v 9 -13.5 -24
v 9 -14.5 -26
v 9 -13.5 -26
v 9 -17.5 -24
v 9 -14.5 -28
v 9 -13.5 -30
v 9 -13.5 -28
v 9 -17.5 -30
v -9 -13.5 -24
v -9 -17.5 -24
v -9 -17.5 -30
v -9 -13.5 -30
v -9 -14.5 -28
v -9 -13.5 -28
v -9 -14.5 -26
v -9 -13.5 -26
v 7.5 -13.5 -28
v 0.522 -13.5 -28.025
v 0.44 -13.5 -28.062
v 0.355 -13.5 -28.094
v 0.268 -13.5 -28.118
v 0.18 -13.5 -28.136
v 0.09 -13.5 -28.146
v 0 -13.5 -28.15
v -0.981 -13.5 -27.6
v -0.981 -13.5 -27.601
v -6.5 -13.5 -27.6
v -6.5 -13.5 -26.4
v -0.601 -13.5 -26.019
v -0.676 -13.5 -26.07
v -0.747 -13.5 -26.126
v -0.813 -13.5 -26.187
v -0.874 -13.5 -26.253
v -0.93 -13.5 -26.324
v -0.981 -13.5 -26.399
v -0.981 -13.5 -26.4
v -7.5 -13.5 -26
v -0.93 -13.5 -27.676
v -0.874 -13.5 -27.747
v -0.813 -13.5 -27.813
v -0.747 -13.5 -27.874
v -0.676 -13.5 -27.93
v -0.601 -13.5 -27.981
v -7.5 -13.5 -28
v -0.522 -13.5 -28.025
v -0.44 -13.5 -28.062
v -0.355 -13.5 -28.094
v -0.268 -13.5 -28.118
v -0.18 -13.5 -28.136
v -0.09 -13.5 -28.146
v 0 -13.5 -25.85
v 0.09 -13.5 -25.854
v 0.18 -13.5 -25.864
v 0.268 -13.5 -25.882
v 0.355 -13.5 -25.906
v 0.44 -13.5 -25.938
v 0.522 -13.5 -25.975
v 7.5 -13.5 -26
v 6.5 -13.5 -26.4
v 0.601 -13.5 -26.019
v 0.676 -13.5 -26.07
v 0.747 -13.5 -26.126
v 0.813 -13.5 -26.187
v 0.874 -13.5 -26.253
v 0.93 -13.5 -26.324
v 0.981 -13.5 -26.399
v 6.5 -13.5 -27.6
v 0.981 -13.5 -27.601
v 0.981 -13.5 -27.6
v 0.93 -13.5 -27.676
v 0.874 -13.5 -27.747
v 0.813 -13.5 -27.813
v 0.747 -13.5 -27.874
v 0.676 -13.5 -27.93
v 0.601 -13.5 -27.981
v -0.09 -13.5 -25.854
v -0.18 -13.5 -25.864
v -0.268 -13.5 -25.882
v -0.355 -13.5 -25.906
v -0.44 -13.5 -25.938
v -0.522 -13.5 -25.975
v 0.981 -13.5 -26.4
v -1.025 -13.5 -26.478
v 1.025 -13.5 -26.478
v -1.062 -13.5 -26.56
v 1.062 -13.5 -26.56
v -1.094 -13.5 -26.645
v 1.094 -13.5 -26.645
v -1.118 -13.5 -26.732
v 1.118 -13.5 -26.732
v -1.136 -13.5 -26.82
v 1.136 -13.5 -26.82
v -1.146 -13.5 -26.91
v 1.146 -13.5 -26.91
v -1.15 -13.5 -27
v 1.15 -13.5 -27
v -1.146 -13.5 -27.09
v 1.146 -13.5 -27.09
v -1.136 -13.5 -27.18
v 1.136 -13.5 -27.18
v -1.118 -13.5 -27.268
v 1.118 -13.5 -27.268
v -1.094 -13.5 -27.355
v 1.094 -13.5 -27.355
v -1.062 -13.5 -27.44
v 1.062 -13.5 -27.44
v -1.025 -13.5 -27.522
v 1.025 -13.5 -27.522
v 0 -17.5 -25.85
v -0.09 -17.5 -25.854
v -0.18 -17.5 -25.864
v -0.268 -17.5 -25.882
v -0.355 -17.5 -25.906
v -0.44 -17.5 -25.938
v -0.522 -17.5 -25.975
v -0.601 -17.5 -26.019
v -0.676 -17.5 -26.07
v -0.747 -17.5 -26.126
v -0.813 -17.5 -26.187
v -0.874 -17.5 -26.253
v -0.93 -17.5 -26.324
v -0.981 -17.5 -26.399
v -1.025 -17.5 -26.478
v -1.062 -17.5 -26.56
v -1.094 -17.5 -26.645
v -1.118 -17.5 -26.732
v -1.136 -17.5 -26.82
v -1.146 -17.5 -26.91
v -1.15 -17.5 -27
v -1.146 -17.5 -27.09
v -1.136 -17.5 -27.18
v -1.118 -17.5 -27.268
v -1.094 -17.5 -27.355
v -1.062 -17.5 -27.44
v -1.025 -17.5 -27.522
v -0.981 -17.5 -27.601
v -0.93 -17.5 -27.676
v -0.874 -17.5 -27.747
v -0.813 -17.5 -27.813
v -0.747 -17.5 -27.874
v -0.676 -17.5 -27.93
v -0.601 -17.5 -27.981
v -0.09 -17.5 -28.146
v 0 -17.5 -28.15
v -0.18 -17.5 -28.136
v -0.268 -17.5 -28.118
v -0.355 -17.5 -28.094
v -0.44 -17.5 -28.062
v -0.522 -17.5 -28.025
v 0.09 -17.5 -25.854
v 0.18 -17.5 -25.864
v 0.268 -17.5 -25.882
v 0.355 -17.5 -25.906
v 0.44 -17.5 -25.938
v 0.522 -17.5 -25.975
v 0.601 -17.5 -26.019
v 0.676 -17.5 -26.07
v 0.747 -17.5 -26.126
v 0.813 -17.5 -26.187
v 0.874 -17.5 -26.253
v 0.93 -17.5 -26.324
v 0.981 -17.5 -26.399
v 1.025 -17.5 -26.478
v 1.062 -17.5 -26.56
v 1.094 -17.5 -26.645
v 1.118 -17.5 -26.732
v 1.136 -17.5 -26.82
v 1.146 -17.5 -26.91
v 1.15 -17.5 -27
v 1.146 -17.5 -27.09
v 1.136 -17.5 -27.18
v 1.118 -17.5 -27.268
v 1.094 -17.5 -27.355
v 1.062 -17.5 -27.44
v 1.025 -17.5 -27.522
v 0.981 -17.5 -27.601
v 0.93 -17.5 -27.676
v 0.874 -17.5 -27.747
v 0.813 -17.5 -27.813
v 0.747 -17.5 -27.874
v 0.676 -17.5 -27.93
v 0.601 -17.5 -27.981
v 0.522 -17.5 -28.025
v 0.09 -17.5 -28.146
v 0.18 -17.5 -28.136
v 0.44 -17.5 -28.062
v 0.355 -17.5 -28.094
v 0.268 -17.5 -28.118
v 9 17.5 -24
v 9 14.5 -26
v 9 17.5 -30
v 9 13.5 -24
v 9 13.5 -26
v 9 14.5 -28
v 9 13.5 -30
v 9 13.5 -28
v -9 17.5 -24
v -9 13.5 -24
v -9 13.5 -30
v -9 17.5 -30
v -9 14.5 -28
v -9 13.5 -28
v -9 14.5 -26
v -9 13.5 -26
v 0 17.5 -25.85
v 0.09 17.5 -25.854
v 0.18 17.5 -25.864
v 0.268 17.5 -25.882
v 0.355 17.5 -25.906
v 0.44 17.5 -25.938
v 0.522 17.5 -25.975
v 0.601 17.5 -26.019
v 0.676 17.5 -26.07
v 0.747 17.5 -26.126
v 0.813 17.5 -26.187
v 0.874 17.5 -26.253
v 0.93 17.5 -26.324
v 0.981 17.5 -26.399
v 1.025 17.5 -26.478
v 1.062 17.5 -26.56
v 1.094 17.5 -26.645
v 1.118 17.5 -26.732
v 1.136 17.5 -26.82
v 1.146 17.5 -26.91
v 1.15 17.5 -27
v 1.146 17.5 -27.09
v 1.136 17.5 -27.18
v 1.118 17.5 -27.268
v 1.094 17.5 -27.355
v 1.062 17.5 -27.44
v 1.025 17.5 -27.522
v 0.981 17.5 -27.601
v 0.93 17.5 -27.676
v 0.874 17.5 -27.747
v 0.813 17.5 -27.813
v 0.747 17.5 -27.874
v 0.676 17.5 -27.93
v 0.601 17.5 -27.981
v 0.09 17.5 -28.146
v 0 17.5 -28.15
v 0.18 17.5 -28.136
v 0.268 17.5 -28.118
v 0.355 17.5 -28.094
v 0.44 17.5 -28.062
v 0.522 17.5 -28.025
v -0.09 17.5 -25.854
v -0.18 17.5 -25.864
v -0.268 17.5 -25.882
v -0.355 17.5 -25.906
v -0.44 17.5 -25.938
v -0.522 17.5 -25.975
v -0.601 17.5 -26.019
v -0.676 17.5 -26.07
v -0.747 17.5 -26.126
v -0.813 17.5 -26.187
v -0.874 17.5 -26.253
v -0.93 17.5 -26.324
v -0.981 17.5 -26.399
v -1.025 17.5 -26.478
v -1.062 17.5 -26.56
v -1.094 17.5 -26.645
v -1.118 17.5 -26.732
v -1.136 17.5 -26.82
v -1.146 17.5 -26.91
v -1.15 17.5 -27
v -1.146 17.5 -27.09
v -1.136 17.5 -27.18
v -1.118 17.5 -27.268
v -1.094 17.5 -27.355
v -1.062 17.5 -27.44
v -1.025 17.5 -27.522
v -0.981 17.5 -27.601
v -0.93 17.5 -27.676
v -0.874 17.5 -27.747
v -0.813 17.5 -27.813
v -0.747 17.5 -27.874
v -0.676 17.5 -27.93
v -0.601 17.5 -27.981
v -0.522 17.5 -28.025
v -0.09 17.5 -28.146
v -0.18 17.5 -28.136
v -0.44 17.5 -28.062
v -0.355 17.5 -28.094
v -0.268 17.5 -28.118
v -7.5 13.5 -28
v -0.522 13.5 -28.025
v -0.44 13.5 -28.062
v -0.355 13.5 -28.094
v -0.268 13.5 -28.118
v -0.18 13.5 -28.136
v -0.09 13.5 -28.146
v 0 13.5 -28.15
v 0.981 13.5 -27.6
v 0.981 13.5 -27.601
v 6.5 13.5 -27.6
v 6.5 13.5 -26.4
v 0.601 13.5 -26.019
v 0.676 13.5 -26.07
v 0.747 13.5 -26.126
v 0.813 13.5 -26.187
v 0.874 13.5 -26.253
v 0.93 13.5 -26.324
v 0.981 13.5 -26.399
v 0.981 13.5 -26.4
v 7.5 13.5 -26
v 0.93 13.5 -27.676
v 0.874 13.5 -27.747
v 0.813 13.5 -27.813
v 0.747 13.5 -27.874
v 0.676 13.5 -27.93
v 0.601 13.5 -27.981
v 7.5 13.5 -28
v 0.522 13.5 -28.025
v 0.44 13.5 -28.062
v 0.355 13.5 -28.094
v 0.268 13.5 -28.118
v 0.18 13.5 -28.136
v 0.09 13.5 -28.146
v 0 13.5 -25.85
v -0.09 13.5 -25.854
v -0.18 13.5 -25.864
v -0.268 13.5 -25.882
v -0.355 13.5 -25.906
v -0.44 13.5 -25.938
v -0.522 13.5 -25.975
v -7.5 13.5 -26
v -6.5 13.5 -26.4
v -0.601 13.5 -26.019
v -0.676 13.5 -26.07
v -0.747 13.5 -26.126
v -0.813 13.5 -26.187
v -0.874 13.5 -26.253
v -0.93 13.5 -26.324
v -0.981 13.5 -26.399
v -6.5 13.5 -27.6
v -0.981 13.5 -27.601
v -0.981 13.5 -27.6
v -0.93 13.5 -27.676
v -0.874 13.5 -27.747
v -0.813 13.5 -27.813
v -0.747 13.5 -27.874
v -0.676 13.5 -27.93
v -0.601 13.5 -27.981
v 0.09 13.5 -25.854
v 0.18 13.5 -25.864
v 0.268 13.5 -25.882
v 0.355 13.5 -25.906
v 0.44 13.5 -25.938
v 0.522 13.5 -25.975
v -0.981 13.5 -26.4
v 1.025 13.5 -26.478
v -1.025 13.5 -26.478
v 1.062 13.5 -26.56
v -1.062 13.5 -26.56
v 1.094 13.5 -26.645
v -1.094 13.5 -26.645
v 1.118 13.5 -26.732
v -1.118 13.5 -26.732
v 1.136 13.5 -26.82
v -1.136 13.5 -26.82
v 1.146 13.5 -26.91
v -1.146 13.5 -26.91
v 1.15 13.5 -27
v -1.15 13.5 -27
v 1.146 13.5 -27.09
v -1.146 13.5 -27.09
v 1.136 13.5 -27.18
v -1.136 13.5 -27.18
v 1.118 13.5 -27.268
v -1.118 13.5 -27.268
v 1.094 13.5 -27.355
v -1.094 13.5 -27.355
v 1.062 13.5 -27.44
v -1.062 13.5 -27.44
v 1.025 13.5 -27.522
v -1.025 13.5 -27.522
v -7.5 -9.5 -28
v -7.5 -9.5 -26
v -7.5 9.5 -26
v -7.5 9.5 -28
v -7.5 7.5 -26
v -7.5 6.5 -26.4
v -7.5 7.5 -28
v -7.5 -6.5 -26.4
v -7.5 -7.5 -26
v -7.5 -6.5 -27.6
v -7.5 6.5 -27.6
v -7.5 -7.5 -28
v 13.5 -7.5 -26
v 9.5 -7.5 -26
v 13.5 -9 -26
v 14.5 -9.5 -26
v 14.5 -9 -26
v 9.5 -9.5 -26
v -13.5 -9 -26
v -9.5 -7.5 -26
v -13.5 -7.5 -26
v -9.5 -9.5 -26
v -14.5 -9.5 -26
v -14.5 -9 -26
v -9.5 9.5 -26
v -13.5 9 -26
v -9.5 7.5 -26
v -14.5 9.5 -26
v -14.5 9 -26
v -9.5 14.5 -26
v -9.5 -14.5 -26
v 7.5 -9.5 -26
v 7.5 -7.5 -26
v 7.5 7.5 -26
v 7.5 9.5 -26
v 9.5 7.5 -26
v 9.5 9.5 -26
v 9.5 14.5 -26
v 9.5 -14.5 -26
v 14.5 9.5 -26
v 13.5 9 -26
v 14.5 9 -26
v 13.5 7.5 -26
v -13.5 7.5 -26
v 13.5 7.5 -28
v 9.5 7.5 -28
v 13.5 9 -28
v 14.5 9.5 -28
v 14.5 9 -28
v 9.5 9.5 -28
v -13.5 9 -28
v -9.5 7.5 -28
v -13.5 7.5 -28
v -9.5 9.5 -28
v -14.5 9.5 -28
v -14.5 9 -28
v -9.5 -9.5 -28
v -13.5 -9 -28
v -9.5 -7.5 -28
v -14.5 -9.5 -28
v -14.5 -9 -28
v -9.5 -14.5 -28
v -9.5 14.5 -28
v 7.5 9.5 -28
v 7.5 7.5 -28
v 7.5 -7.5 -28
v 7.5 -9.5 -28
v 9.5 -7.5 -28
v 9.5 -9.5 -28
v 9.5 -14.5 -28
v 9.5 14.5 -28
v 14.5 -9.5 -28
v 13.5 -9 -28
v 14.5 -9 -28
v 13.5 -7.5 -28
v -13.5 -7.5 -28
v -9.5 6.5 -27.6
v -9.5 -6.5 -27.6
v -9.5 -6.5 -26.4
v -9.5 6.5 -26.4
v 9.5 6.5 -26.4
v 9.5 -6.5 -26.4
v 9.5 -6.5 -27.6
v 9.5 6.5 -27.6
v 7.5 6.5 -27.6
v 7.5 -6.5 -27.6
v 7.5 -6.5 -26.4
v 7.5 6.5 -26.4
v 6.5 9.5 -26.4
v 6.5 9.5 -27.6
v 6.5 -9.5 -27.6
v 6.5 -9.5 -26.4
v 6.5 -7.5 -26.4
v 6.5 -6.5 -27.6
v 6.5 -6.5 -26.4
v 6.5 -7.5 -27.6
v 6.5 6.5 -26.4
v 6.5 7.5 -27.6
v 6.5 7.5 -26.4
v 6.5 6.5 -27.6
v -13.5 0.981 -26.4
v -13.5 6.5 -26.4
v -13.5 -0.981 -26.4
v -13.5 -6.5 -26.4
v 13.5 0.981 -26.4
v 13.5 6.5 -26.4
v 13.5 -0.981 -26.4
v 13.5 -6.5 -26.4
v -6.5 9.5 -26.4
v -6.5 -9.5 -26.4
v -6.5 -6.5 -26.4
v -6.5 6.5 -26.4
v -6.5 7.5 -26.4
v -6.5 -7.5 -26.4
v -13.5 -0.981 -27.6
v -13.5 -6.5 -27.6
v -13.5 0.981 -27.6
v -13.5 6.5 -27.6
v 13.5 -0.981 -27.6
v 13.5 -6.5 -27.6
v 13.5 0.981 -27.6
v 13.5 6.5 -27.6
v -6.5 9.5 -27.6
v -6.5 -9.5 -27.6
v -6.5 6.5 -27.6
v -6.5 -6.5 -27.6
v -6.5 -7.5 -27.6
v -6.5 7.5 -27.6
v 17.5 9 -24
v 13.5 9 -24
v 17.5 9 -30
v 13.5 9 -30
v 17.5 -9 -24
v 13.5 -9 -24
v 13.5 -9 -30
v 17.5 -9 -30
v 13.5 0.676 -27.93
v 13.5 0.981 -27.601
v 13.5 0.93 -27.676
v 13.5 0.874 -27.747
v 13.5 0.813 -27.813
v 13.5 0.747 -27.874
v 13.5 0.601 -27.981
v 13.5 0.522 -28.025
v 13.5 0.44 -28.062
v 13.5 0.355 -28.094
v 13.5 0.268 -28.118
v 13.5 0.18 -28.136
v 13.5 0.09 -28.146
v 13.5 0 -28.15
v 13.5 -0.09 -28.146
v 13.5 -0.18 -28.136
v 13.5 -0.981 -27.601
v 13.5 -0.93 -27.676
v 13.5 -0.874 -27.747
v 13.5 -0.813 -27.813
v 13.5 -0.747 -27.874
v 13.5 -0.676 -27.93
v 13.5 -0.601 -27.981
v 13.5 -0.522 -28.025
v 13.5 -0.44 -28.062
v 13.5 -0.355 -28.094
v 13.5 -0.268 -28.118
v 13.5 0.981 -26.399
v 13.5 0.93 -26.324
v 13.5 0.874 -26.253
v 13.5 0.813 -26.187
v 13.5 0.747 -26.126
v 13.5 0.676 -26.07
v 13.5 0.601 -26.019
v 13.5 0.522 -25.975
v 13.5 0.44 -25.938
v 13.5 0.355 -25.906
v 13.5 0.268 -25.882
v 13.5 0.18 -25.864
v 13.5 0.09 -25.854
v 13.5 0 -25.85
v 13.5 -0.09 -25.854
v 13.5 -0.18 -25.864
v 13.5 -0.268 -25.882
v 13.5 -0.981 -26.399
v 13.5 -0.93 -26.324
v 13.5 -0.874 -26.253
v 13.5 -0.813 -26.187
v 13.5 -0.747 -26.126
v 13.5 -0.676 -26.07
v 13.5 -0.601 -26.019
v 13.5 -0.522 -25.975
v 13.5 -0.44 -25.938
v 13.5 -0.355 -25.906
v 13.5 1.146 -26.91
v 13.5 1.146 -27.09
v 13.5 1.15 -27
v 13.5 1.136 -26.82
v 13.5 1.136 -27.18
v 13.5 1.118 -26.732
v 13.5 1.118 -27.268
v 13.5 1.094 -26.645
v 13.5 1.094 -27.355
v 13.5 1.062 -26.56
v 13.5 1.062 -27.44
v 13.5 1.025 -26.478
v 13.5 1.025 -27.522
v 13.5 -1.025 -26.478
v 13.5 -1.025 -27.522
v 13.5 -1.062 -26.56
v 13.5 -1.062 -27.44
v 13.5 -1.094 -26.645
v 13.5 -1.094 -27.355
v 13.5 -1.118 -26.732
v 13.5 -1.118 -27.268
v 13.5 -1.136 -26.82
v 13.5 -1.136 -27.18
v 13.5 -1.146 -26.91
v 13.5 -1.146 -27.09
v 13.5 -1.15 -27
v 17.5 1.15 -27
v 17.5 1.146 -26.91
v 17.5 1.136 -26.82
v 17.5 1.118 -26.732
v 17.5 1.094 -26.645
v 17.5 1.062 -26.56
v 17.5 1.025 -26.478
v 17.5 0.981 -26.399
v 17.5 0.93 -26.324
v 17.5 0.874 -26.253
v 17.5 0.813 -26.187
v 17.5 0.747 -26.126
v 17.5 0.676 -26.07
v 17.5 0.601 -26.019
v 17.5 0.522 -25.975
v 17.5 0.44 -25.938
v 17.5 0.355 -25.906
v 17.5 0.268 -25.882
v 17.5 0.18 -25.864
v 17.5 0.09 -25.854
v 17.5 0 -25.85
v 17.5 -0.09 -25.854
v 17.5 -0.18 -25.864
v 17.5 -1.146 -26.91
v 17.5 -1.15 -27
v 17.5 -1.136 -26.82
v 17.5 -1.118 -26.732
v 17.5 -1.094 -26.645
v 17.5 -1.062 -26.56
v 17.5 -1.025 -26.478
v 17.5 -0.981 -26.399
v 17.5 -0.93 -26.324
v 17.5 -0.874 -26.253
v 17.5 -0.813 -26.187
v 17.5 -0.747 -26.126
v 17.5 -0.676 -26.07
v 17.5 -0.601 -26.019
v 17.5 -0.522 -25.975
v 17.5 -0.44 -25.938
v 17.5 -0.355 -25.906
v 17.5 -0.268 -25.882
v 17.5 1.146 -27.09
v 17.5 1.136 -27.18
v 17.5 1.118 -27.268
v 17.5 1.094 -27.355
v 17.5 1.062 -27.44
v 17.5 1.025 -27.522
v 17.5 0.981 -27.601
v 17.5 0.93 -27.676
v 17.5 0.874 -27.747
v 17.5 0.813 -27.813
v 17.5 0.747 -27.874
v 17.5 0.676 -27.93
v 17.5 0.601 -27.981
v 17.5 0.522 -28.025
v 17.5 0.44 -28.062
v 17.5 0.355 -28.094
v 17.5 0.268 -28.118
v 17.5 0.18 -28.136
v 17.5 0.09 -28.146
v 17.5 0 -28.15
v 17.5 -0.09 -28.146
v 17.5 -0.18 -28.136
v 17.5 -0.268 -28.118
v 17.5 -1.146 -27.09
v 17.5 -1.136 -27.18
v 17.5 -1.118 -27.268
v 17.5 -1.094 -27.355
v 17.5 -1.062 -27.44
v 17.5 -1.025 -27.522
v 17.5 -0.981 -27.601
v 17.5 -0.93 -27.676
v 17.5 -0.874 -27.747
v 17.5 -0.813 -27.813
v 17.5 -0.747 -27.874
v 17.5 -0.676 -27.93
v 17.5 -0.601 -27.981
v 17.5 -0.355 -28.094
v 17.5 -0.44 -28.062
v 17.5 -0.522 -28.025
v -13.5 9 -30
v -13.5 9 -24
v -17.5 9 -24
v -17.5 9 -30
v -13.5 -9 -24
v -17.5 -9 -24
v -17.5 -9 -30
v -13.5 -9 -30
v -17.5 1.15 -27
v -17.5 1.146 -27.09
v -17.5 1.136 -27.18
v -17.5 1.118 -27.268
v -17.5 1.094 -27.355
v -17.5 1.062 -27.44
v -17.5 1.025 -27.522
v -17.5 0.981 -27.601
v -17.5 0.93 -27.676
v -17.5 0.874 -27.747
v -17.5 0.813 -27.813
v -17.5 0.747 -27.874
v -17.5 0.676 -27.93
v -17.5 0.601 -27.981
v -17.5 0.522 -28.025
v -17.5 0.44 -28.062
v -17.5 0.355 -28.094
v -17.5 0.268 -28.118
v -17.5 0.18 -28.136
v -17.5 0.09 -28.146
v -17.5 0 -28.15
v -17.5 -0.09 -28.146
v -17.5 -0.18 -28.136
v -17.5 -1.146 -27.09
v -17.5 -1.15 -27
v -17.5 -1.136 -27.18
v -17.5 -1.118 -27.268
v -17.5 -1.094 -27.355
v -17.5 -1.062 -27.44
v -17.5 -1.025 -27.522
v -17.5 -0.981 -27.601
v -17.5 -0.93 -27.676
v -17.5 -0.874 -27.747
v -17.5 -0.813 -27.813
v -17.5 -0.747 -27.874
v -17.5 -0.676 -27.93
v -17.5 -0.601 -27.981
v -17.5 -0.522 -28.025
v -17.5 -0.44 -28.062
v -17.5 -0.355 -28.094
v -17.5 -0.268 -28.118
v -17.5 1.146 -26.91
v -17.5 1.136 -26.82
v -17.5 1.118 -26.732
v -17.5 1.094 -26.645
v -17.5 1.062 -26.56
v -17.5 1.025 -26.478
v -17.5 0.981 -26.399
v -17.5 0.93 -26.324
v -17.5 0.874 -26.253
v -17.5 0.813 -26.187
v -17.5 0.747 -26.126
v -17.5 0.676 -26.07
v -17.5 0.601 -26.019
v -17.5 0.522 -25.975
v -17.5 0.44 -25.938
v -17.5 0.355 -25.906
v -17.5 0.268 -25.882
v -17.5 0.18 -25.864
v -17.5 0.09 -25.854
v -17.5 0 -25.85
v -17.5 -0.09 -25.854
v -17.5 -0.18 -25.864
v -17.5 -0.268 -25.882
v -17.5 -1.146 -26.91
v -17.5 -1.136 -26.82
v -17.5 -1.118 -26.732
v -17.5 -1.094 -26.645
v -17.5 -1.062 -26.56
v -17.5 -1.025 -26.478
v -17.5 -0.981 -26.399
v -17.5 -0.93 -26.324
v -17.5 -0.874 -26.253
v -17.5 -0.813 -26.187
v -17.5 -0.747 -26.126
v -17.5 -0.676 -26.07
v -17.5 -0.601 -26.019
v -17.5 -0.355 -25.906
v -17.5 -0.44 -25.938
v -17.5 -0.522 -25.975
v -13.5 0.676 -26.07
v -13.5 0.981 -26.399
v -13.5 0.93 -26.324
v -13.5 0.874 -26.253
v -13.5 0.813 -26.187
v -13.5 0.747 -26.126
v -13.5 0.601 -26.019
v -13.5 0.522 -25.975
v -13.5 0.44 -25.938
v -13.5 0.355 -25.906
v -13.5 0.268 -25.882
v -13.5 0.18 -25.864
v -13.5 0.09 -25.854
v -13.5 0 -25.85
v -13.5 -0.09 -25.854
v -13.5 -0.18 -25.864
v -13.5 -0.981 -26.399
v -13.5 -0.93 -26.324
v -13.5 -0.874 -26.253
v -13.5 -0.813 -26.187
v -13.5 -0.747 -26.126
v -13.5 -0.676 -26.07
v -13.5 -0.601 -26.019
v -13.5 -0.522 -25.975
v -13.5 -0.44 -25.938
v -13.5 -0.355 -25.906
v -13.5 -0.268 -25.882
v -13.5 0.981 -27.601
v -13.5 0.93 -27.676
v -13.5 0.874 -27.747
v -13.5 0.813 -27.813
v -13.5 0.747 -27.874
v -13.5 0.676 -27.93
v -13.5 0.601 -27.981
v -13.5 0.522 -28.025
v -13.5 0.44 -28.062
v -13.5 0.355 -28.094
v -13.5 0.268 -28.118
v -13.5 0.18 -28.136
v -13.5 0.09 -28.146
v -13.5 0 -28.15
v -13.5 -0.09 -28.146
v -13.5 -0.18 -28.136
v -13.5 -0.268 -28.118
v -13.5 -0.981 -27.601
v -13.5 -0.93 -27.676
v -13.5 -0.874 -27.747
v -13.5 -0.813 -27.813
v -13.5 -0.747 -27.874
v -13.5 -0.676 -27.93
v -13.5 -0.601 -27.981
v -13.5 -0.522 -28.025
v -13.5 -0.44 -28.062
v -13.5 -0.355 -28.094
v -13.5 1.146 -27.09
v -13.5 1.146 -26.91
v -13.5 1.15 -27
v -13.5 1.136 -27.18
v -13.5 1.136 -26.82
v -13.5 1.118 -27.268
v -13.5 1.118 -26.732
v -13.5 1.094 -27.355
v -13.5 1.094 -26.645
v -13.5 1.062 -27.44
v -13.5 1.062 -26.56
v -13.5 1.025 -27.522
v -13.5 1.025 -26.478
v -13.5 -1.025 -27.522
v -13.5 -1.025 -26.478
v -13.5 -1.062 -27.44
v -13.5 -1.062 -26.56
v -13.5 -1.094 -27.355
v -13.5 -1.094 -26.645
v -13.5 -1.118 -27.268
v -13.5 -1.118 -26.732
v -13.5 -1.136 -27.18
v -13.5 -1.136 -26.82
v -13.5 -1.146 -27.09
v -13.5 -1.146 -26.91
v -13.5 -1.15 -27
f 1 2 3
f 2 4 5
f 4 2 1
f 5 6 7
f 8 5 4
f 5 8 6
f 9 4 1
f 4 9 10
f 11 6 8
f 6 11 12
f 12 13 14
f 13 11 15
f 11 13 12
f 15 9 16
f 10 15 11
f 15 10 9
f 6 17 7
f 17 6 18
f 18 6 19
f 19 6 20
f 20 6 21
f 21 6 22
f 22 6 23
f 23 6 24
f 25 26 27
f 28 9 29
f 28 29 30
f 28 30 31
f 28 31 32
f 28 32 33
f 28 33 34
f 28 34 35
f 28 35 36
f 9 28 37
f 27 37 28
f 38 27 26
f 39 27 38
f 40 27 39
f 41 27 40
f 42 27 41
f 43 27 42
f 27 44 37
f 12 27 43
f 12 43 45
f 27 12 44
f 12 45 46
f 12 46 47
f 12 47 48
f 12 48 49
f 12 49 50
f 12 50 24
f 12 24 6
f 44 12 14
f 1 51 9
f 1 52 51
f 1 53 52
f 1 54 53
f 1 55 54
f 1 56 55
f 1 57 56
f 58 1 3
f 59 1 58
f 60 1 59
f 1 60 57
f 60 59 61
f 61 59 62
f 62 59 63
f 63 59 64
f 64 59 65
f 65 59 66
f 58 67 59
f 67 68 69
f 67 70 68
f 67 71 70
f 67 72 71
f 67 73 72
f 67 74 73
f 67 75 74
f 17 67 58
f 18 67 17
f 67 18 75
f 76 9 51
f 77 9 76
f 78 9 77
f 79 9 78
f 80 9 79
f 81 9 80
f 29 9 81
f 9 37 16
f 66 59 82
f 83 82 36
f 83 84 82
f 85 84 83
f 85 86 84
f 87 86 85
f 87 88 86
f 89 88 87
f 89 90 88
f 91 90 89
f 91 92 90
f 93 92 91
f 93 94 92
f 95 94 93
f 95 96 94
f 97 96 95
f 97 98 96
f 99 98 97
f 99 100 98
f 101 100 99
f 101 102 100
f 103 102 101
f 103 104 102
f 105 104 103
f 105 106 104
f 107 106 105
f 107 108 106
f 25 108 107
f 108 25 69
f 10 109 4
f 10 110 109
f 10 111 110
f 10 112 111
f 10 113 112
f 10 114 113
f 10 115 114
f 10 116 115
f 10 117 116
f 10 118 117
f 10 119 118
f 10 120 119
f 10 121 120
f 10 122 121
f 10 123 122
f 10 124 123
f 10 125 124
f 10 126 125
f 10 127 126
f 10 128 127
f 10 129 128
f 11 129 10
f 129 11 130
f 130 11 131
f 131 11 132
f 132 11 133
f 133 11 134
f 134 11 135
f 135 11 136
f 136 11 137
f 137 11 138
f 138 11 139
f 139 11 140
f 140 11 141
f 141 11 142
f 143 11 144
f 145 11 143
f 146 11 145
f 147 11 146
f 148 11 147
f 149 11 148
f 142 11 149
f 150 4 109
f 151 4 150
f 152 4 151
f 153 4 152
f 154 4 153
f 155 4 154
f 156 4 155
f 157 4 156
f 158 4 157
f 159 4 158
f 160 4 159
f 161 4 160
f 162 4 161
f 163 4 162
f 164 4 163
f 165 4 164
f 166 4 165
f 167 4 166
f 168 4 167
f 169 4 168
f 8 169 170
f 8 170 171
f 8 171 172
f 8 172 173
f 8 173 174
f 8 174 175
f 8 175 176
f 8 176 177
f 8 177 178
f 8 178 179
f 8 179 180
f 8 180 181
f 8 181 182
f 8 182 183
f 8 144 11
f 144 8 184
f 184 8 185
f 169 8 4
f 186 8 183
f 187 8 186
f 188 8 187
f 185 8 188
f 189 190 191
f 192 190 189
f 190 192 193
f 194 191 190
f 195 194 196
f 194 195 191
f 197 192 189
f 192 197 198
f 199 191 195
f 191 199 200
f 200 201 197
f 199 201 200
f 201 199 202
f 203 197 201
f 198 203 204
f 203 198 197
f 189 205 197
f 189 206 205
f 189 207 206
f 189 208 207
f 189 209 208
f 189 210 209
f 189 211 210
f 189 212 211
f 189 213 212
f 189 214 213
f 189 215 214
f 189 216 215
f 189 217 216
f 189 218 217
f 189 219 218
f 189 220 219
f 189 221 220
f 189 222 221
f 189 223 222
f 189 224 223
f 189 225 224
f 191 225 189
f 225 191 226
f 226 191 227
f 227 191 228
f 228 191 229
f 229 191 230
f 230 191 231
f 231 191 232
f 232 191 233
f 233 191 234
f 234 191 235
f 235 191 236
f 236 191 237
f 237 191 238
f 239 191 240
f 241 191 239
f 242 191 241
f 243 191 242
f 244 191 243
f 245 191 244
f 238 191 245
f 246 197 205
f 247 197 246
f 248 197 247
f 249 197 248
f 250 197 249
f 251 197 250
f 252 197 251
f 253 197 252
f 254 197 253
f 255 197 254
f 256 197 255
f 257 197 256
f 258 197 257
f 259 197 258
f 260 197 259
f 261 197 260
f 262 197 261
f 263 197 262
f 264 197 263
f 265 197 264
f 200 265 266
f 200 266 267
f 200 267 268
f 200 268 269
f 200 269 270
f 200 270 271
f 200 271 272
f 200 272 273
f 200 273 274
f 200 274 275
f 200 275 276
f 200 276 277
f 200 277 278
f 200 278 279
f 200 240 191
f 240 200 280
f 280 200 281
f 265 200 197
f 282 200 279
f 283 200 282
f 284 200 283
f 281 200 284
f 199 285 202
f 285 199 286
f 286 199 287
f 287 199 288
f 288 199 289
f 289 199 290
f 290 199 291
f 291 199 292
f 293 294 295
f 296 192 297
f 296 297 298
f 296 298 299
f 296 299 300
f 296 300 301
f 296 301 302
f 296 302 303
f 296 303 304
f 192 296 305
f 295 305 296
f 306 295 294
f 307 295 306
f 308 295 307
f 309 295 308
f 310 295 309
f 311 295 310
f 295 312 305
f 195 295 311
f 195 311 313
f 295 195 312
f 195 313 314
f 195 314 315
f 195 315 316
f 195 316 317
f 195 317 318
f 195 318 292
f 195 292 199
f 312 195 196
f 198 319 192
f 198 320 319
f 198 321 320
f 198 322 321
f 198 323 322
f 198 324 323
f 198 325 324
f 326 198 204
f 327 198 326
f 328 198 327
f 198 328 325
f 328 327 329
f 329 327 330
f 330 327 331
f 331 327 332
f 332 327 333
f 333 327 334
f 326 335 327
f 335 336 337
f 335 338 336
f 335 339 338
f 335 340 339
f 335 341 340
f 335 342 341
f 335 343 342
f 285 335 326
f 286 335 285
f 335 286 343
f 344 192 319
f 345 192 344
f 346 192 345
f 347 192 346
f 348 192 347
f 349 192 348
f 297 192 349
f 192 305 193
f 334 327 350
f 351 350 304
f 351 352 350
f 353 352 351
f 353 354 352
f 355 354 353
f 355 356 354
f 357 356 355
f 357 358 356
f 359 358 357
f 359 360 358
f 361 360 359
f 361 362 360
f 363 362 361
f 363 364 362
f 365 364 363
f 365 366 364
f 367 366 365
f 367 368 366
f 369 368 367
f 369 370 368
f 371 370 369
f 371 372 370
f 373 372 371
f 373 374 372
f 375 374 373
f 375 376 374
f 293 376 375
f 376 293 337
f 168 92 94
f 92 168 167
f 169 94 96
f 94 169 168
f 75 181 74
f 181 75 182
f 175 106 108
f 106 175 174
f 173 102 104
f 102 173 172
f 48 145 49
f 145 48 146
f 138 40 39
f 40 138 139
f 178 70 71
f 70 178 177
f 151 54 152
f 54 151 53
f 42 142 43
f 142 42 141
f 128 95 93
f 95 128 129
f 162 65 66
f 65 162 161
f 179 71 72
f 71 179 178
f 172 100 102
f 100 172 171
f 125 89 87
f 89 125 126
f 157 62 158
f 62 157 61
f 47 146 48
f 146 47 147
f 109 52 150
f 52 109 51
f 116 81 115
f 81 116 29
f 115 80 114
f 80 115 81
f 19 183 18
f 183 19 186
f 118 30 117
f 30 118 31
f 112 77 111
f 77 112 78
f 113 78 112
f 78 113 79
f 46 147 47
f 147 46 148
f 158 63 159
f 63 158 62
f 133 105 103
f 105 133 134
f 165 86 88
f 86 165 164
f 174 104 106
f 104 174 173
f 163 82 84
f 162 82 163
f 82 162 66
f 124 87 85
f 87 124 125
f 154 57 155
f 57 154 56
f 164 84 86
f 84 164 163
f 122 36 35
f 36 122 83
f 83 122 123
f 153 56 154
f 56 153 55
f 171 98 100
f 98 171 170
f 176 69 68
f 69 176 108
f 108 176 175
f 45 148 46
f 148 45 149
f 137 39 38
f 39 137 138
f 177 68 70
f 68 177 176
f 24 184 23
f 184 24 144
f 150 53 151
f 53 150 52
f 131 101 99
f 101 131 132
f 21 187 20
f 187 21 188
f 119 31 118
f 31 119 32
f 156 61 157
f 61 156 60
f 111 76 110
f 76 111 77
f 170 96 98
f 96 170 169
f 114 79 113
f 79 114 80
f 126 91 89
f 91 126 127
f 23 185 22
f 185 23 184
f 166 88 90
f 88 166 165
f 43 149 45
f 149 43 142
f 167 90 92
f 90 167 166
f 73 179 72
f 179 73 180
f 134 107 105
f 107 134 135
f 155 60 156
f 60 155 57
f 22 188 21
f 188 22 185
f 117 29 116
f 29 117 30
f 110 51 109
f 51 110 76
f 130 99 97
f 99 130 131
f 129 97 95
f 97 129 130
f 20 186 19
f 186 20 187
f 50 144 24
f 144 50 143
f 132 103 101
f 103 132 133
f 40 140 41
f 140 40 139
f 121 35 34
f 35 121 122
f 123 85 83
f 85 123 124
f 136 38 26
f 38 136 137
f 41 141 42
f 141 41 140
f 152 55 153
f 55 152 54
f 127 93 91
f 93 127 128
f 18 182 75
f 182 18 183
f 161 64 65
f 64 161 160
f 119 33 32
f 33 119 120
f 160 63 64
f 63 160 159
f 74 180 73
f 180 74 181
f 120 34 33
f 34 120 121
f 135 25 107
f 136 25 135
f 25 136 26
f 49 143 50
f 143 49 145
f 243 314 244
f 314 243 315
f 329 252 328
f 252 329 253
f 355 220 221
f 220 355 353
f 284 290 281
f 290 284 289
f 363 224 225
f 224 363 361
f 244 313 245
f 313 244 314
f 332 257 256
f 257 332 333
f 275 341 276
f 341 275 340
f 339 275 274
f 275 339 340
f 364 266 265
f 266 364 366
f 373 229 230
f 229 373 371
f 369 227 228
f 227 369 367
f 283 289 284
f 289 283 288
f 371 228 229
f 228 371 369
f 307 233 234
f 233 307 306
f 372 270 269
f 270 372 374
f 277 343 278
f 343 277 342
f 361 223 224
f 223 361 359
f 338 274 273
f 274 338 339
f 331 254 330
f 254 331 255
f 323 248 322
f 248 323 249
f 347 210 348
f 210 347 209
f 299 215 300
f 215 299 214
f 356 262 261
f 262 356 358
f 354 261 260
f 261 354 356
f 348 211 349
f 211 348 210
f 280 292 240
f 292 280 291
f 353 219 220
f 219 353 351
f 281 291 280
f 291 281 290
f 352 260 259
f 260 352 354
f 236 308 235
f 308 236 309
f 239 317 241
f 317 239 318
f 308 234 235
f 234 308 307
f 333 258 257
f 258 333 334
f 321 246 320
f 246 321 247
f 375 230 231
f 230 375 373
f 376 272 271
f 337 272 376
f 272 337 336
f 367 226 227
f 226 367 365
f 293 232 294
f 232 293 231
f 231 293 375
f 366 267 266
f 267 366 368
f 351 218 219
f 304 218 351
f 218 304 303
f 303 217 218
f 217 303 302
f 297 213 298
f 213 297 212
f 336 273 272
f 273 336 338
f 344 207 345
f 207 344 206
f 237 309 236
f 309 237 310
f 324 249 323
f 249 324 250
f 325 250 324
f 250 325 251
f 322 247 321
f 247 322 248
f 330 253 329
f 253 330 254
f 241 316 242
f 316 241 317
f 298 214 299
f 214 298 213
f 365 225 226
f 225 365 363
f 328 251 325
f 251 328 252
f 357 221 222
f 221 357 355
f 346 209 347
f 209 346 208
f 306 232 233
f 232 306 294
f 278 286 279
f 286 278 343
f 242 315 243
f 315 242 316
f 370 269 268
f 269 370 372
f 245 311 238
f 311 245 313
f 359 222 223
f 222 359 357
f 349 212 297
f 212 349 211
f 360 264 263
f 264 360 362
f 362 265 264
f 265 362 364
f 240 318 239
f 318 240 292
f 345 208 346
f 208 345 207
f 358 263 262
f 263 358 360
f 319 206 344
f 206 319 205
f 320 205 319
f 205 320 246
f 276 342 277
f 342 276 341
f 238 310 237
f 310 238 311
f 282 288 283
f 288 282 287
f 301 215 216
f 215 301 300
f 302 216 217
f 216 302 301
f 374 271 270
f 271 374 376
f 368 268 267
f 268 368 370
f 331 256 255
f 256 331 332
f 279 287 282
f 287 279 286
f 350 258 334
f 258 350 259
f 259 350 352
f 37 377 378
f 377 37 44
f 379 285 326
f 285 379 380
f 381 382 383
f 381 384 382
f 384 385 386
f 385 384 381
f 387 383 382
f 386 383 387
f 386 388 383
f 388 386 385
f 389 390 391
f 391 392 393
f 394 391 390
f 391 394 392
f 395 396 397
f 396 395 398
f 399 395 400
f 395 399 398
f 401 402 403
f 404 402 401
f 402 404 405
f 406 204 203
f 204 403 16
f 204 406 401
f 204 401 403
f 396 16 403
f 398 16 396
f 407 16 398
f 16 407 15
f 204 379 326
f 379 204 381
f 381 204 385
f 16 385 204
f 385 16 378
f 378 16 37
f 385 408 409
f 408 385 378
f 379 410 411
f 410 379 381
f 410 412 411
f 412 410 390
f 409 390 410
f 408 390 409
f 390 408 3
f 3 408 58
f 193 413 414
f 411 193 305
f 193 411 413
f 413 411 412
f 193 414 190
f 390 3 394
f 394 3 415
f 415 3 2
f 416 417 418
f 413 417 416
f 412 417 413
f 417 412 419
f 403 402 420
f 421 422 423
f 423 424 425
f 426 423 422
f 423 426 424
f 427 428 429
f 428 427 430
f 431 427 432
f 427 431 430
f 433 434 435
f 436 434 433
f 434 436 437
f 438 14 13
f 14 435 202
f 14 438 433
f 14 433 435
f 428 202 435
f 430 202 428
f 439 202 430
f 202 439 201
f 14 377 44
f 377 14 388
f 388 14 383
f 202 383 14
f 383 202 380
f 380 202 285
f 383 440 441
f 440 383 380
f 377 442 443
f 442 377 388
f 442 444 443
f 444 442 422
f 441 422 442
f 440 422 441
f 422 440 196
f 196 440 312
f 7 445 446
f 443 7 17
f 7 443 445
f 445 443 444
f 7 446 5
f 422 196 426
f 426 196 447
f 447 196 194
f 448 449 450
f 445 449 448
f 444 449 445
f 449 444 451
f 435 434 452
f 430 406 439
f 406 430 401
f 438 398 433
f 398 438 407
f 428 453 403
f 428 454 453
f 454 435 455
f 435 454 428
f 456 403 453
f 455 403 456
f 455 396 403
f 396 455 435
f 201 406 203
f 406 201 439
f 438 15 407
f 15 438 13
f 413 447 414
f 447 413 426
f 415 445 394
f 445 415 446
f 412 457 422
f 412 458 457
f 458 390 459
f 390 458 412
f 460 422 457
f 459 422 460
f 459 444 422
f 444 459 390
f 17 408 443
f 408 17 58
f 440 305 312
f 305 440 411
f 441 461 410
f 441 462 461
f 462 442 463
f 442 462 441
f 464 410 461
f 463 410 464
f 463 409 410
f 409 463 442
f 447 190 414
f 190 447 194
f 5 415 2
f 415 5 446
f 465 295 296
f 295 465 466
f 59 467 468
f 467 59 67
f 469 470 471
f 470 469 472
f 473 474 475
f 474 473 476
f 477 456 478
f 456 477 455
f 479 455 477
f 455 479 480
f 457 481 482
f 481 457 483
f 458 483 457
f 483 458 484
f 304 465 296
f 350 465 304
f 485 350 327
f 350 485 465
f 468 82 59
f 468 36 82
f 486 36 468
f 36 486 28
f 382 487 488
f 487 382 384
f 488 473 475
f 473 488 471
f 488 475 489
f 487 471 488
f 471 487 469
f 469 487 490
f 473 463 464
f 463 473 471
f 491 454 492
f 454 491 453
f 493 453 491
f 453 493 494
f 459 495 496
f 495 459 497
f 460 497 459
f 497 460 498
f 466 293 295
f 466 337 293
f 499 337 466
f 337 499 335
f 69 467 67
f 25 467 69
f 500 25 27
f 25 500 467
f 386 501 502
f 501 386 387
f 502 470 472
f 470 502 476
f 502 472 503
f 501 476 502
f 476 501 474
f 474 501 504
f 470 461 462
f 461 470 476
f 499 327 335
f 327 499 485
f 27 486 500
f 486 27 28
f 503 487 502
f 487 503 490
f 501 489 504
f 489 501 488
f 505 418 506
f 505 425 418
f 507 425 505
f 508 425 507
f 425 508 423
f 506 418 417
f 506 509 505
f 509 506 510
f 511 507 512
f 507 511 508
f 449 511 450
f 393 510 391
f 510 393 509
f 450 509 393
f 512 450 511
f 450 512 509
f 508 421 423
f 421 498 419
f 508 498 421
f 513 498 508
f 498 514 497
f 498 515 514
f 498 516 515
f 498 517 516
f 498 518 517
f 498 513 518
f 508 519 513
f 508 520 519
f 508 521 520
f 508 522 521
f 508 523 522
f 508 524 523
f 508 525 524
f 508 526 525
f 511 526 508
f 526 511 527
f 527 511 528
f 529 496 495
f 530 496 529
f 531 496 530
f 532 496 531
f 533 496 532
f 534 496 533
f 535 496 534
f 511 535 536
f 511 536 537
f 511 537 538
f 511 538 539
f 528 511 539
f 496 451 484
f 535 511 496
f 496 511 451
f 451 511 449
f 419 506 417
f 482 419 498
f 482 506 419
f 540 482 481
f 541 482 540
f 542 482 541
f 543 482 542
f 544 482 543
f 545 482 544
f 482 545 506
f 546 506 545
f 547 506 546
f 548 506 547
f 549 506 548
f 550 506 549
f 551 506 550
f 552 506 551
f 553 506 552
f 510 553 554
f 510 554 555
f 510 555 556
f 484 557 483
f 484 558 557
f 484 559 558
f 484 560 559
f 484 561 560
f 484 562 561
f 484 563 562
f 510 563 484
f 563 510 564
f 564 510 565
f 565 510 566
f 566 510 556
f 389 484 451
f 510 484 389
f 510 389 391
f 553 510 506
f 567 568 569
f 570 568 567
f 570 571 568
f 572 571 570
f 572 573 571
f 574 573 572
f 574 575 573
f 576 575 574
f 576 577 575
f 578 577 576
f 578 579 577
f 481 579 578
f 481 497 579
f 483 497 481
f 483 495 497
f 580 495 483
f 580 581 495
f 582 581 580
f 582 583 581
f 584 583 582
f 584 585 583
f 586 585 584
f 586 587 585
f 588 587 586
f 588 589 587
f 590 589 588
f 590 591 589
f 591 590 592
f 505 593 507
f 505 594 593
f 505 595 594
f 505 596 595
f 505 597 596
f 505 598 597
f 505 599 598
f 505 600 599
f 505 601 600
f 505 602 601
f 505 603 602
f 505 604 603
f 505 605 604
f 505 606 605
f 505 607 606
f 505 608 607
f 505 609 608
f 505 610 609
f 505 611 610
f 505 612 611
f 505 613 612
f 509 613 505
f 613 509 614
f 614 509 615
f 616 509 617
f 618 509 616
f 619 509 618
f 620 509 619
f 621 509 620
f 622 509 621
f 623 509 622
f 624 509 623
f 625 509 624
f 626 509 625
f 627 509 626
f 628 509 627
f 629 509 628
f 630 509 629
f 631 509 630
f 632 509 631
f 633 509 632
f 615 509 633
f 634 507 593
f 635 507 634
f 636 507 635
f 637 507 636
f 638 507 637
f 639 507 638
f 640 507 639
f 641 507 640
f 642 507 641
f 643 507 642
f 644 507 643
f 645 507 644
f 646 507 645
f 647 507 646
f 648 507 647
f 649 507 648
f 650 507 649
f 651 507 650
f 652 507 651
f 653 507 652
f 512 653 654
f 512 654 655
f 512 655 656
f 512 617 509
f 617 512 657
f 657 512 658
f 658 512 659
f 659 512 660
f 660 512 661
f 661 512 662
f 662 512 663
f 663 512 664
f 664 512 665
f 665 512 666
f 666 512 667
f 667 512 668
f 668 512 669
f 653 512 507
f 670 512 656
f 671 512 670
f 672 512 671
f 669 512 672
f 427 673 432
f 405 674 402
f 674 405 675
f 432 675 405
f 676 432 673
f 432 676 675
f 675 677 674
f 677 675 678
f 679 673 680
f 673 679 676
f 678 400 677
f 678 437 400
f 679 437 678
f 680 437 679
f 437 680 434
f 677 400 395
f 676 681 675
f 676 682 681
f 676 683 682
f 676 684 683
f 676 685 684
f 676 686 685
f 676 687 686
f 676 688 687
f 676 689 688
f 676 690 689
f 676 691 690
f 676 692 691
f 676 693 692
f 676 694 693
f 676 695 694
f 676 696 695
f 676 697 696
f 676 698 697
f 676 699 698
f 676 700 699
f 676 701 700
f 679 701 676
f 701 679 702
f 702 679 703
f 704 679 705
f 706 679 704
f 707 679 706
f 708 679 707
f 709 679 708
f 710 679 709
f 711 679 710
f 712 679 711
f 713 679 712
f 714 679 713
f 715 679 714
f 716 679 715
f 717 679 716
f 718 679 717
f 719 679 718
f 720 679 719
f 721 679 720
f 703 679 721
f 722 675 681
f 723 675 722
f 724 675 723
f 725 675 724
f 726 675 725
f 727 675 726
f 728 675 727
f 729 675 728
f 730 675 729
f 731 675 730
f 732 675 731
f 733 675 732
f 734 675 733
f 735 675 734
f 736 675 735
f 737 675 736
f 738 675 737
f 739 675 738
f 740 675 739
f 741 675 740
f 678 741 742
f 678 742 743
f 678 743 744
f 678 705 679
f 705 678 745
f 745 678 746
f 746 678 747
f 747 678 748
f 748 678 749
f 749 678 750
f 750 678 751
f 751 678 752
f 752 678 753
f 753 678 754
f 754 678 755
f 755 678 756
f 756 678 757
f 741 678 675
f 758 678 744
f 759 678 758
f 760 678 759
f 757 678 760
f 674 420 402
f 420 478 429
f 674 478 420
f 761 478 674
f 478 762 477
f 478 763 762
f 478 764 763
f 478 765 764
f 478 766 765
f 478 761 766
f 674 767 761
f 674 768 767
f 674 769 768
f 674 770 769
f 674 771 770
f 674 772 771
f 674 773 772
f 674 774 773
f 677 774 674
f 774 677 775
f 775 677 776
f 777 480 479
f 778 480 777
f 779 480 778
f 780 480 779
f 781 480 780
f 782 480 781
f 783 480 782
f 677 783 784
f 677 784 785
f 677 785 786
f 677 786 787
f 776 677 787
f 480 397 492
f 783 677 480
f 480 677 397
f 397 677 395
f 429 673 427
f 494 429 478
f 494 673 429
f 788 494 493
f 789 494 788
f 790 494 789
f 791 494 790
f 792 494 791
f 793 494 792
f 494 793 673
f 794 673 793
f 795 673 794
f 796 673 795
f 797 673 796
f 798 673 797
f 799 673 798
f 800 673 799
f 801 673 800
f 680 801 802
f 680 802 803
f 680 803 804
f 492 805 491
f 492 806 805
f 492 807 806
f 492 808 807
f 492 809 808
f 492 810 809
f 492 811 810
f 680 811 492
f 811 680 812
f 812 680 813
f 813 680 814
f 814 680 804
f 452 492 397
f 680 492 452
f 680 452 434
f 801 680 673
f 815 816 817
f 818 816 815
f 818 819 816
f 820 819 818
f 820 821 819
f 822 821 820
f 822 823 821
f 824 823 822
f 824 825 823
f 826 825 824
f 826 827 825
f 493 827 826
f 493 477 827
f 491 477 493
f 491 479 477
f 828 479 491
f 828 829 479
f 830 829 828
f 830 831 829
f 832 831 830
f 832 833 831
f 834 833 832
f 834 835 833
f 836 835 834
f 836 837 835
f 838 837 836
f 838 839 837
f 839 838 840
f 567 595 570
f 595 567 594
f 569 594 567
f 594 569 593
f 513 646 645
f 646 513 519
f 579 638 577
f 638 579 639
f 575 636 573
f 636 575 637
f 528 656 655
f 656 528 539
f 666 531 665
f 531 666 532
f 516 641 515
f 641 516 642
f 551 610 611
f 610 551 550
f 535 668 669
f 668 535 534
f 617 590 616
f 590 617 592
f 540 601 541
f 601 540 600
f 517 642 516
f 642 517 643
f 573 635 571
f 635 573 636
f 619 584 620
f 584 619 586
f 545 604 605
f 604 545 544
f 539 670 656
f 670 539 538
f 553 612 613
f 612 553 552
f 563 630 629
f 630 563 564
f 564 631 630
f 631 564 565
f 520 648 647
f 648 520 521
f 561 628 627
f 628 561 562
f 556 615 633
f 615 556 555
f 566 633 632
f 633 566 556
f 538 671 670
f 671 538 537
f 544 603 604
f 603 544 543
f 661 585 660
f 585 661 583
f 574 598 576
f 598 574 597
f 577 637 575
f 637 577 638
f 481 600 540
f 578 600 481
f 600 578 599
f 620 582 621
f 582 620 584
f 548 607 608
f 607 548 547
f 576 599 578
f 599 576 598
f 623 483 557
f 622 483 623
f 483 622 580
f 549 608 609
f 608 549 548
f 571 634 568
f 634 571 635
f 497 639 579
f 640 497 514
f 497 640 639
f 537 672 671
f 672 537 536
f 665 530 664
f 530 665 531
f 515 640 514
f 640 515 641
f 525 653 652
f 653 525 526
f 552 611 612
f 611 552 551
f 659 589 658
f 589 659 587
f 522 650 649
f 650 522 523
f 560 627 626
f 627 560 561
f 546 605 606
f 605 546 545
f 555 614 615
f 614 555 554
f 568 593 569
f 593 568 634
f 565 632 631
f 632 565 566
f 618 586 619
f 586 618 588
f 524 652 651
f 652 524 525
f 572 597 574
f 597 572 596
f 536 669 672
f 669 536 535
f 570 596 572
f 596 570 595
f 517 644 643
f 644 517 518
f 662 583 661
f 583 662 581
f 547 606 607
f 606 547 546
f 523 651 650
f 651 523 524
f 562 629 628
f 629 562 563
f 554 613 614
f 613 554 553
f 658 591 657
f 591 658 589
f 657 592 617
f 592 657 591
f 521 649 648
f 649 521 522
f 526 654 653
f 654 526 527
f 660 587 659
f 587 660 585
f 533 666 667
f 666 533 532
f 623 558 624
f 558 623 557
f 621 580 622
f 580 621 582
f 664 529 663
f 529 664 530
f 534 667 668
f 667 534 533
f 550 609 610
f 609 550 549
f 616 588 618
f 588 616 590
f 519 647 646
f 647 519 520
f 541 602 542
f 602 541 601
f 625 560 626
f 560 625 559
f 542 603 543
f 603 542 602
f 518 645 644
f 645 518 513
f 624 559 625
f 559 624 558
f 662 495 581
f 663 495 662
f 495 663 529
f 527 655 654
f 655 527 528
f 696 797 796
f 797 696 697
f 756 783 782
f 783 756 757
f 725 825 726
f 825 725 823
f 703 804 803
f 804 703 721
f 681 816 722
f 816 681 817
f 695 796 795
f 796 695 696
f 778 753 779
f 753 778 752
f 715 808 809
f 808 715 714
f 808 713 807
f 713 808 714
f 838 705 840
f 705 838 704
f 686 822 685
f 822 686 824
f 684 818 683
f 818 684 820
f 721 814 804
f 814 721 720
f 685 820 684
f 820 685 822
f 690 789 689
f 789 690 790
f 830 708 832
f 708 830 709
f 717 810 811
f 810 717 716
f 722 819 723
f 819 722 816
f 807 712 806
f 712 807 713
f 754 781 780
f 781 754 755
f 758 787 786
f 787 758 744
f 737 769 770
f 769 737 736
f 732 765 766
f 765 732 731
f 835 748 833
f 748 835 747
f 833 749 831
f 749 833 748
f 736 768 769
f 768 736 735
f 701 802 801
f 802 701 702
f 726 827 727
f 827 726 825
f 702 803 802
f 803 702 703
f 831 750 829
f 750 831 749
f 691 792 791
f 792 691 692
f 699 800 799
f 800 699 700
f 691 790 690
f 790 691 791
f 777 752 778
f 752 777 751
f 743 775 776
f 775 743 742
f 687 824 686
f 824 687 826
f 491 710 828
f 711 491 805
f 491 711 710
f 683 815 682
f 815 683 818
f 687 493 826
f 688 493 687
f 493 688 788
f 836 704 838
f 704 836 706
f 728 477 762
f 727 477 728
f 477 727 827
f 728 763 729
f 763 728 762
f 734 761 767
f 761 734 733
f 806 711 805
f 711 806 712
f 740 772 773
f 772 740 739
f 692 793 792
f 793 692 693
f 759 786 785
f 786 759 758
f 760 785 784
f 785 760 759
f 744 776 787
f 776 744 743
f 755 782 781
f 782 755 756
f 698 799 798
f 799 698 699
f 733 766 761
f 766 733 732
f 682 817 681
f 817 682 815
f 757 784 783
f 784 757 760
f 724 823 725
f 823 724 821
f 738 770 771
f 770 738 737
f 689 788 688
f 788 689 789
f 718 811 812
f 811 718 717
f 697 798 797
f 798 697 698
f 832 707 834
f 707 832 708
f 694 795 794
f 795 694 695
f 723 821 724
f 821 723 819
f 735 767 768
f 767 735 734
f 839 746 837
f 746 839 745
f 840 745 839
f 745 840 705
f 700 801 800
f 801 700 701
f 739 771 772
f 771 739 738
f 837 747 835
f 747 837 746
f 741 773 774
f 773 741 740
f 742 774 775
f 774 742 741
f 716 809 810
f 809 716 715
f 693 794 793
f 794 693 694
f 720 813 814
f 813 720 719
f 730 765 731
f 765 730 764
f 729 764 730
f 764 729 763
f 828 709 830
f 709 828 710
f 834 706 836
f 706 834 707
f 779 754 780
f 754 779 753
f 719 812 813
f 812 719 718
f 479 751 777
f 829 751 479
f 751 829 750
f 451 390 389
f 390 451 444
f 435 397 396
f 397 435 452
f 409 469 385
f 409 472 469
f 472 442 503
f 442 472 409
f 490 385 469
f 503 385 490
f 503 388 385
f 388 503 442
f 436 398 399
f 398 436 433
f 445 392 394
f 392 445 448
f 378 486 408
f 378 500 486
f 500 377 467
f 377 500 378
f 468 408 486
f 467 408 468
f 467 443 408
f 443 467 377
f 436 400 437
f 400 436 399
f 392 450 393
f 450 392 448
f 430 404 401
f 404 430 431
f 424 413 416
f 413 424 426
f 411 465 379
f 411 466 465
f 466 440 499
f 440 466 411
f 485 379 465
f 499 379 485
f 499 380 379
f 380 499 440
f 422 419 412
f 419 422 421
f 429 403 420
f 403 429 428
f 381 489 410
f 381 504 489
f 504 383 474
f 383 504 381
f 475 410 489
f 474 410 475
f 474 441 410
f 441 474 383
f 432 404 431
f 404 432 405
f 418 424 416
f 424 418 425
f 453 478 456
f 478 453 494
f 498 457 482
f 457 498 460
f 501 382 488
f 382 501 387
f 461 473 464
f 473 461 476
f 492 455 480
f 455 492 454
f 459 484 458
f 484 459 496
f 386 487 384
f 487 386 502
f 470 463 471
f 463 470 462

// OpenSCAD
// file: 55_stage1_print_parameters.scad
/* BUDDY FILE 55 - STAGE 1 PRINT / INTERFACE PARAMETERS
All dimensions mm. Values marked PROCESS are starting points for calibration coupons. */
B1_OD=115; B1_CAVITY_D=111; B1_AIRWAY_D=70; B1_DUCT_OD=74;
B1_SHELL_R=B1_OD/2; B1_CAVITY_R=B1_CAVITY_D/2;
B1_WALL=2.0; B1_MIN_RIB=2.2; B1_MIN_WEB=1.2;
B1_FDM_SLIDE=0.30;       // PROCESS: per side, calibrate
B1_FDM_PRESS=0.10;       // PROCESS: per side, calibrate
B1_INSERT_OD=3.2;        // PLACEHOLDER for M2-class heat-set insert; replace from selected insert drawing
B1_M2_CLEAR=2.4;         // PROCESS starting clearance
B1_M2_HEAD=4.3;          // PLACEHOLDER head pocket
B1_M2_HEAD_H=1.8;
B1_POLAR_OPENING_D=74.8;
B1_CAMERA_DUCT_GAP=0.8; B1_CAMERA_SHELL_MARGIN=1.0;
B1_ROTOR_NOMINAL_R=34.6; B1_ROTOR_STATIC_RADIAL_GAP=B1_AIRWAY_D/2-B1_ROTOR_NOMINAL_R;
assert(B1_OD==115); assert(B1_CAVITY_D==111); assert(B1_AIRWAY_D==70);
assert(B1_POLAR_OPENING_D>B1_DUCT_OD);
assert(B1_ROTOR_STATIC_RADIAL_GAP>0);
echo("FILE55 Stage1 architecture OD/cavity/airway =",B1_OD,B1_CAVITY_D,B1_AIRWAY_D);
echo("PROCESS tolerances require calibration before production prints");
// main file
/* BUDDY FILE59 - VANE CARTRIDGE V2
Four removable downstream control-vane cartridges. Mechanical hard stops included.
Aerodynamic authority remains unverified. */
include <55_stage1_print_parameters.scad>
$fn=80; VANE_Z=-27; VANE_SPAN=27; VANE_CHORD=13; VANE_T=1.2; SHAFT_D=2; FRAME_W=6; ANGLE=0;
module vane(){rotate([0,ANGLE,0])cube([VANE_CHORD,VANE_SPAN,VANE_T],center=true);}
module cartridge(){difference(){union(){translate([0,-VANE_SPAN/2-2,0])cube([VANE_CHORD+5,4,FRAME_W],center=true);translate([0,VANE_SPAN/2+2,0])cube([VANE_CHORD+5,4,FRAME_W],center=true);}for(y=[-VANE_SPAN/2-2,VANE_SPAN/2+2])translate([0,y,0])rotate([90,0,0])cylinder(h=6,d=SHAFT_D+B1_FDM_SLIDE,center=true);}vane();hard_stops();}
module hard_stops(){for(s=[-1,1])translate([s*(VANE_CHORD/2+2),0,0])cube([2,VANE_SPAN+2,2],center=true);}
module system(){for(a=[0:90:270])rotate([0,0,a])translate([0,0,VANE_Z])cartridge();}
system();
assert(VANE_SPAN< B1_AIRWAY_D);
assert(abs(ANGLE)<=25,"commanded vane angle exceeds Stage1 limit");
echo("FILE59 replaceable vane cartridge angle=",ANGLE);
